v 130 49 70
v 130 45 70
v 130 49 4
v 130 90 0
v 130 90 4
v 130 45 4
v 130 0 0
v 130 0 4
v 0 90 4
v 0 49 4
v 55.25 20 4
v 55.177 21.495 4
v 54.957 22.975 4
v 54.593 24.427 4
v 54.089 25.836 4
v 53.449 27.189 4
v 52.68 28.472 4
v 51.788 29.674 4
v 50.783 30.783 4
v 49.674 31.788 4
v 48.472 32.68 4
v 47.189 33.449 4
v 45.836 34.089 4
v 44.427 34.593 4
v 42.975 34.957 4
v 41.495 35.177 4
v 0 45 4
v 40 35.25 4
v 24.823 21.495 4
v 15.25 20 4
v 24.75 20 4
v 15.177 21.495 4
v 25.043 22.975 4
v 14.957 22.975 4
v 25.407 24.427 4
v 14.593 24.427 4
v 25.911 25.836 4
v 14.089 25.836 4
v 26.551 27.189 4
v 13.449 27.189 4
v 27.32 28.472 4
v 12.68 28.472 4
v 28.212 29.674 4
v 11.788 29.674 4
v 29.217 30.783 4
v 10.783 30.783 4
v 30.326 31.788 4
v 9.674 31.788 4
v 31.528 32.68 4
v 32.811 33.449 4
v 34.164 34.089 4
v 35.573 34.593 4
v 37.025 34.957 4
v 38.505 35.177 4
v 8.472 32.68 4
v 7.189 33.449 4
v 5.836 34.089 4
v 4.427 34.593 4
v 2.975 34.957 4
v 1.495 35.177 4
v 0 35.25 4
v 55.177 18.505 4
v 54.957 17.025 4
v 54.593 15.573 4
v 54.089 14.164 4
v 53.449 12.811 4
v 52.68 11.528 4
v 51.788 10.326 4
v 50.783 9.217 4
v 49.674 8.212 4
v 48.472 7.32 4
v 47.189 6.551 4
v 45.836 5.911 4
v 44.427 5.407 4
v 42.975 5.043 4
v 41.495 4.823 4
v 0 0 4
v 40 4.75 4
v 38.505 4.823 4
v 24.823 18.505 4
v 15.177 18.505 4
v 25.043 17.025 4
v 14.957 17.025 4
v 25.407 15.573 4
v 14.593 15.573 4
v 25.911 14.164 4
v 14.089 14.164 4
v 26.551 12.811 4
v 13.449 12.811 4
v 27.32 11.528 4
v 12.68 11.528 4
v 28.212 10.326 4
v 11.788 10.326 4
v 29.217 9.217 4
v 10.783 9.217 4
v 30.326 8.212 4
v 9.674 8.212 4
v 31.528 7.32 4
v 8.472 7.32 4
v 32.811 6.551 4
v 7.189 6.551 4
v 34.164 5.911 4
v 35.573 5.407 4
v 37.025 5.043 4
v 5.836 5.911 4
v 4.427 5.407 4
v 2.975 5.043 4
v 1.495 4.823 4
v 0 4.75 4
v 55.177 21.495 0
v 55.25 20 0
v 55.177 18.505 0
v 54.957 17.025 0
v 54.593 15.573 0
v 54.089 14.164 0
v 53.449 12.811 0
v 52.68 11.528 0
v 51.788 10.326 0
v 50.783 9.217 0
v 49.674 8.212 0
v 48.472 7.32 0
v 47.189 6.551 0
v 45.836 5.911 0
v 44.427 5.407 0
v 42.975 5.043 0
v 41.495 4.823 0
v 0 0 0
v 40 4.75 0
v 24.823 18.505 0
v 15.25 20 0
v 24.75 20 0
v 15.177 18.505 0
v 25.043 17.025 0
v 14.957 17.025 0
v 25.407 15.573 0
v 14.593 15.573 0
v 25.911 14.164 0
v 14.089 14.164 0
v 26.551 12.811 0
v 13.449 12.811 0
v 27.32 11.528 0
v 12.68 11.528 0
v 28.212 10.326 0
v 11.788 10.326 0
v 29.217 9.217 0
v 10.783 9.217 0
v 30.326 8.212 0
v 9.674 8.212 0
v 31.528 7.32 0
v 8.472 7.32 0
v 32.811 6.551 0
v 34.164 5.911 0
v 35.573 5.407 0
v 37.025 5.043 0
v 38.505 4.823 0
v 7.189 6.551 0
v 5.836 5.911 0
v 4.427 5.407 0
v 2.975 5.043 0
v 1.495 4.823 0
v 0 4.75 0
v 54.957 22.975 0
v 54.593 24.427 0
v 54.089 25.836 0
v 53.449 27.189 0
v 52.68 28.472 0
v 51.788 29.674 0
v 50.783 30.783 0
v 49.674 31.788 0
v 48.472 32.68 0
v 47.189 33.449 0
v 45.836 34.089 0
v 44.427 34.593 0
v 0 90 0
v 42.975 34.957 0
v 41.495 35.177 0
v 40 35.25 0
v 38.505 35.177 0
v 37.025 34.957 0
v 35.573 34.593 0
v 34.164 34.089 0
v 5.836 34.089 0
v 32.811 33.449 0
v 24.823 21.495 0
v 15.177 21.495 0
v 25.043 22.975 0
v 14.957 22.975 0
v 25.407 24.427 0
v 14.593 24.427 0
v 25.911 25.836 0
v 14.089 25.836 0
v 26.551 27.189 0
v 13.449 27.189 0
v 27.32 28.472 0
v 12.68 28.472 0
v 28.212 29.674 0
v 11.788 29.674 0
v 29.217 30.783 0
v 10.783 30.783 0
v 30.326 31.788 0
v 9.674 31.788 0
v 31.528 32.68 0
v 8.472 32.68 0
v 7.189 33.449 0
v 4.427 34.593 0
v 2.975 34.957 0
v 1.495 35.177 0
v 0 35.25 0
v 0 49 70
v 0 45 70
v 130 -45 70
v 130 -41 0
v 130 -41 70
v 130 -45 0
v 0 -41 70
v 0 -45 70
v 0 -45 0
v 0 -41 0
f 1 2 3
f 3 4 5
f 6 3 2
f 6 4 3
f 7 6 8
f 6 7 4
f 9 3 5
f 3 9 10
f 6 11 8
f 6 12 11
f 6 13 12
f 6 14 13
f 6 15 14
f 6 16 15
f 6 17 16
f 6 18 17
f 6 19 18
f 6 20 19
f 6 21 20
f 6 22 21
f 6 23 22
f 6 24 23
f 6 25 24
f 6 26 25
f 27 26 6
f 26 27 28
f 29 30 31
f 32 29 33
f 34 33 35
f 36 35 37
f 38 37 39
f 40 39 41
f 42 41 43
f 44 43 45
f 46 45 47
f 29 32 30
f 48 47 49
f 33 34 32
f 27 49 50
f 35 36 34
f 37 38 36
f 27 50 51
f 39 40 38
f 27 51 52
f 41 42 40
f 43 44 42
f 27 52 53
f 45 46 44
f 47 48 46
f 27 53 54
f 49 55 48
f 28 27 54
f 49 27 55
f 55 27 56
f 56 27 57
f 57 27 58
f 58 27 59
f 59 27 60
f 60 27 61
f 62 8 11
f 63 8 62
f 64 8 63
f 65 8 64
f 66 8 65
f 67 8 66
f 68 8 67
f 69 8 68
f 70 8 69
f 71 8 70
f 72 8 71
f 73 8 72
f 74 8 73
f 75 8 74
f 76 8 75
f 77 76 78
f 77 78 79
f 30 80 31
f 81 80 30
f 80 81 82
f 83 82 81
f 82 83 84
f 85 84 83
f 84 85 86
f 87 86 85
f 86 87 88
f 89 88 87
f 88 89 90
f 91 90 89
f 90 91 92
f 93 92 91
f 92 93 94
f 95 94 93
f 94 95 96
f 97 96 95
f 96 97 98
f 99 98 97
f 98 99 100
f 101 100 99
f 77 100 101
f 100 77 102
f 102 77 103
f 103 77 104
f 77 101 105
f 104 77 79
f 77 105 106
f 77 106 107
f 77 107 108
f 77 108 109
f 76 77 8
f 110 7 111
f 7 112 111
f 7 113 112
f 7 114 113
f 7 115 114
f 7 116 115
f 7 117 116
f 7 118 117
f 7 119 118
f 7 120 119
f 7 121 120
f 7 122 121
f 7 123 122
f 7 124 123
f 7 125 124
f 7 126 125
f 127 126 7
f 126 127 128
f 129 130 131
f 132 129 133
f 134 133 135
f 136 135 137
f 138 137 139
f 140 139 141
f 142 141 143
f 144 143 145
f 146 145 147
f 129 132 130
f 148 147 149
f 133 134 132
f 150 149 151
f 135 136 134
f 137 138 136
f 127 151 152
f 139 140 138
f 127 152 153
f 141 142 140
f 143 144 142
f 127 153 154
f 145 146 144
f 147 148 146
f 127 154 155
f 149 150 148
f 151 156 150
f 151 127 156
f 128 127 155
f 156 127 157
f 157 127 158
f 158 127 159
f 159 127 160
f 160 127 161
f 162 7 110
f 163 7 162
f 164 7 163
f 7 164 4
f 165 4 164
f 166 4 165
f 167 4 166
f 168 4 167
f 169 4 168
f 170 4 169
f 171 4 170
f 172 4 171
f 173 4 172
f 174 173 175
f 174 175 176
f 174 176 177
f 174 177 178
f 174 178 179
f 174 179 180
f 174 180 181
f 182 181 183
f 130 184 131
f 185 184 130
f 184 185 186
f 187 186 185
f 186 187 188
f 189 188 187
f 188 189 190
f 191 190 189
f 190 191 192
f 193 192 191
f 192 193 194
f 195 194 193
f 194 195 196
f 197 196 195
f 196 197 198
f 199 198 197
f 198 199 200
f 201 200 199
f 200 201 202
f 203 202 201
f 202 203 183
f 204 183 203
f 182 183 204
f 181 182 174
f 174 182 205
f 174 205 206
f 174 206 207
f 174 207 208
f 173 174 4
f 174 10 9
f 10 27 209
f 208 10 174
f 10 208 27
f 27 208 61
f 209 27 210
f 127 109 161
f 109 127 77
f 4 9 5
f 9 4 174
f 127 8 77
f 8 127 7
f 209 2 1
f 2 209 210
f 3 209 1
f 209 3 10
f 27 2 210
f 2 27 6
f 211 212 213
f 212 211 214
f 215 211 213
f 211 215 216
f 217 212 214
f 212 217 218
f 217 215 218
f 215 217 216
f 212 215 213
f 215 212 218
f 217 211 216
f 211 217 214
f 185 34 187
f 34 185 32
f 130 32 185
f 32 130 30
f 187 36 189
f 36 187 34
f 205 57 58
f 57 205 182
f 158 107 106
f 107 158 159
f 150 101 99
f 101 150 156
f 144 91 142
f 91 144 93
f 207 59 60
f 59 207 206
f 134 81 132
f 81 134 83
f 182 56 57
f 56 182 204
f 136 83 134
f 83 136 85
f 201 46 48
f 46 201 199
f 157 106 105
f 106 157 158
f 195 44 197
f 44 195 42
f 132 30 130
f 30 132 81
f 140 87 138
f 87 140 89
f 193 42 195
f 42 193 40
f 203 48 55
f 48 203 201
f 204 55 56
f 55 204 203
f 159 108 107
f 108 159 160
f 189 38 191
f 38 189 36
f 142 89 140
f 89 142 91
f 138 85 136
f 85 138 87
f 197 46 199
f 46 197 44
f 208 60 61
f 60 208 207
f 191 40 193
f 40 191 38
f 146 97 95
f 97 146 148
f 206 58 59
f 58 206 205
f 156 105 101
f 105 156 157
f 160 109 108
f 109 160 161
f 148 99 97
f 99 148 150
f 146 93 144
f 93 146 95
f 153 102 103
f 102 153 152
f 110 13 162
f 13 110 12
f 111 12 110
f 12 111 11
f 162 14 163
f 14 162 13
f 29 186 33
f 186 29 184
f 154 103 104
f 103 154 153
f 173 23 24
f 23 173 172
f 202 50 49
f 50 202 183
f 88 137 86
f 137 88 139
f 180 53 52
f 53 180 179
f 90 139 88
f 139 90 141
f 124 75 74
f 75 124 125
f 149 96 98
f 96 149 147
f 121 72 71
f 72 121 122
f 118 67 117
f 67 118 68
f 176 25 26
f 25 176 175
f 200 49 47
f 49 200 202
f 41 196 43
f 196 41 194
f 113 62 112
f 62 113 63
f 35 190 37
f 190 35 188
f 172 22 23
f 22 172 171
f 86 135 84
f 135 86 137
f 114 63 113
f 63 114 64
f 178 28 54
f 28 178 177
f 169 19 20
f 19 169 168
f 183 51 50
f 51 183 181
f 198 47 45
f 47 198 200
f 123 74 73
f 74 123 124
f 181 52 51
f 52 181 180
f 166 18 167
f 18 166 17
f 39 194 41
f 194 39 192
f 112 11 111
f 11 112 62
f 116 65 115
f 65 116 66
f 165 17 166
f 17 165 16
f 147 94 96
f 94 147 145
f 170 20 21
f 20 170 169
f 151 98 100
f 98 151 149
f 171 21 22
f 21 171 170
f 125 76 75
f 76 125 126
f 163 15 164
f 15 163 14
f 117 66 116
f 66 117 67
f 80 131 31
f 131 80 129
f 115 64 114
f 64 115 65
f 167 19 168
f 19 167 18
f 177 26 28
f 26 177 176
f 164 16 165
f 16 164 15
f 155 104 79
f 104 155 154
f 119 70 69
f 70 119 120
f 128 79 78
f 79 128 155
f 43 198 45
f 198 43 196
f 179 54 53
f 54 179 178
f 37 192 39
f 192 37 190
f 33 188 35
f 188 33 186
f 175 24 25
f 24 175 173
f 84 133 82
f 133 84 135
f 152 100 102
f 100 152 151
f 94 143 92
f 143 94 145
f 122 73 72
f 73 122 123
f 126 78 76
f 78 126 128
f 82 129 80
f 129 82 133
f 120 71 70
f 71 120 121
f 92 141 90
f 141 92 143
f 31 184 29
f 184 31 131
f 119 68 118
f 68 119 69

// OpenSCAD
// Rack for six 50 mL conical (Falcon-type) tubes
// Print orientation: flat plate on bed (z=0), walls rise up.
// After printing, flip over so walls are on bottom and tubes pass through holes.

// --- Plate dimensions ---
plate_x = 130;       // Plate length (X)
plate_y = 90;         // Plate width (Y)
plate_z = 4;          // Plate thickness

// --- Hole pattern ---
hole_dia = 30.5;     // Hole diameter
hole_rows = 2;        // Number of rows (along Y)
hole_cols = 3;        // Number of columns (along X)
pitch_x = 40;         // Centre-to-centre spacing in X
pitch_y = 40;          // Centre-to-centre spacing in Y

// --- Wall dimensions ---
wall_length = 130;    // Wall length (X), flush with plate long edge
wall_thick = 4;       // Wall thickness (Y)
wall_height = 70;     // Wall height from plate top

// --- Derived values ---
// Hole centres: centred on plate in X and Y
hole_x_start = -(hole_cols - 1) * pitch_x / 2;
hole_y_start = -(hole_rows - 1) * pitch_y / 2;

// Wall position: flush with plate long edge (Y = ±plate_y/2)
wall_y_pos = plate_y / 2;

// --- Build the part ---
difference() {
    // Plate
    union() {
        // Main plate body
        cube([plate_x, plate_y, plate_z], center = [false, false, false]);
        
        // Two walls along long edges (Y = ±plate_y/2)
        // Wall along Y = +plate_y/2
        translate([0, wall_y_pos, 0])
            cube([wall_length, wall_thick, wall_height], center = [false, false, false]);
        
        // Wall along Y = -plate_y/2
        translate([0, -wall_y_pos, 0])
            cube([wall_length, wall_thick, wall_height], center = [false, false, false]);
    }
    
    // Cut through-holes
    for (i = [0 : hole_cols - 1]) {
        for (j = [0 : hole_rows - 1]) {
            hx = hole_x_start + i * pitch_x;
            hy = hole_y_start + j * pitch_y;
            
            translate([hx, hy, -0.01])
                cylinder(d = hole_dia, h = plate_z + 0.02, $fn = 64);
        }
    }
}
